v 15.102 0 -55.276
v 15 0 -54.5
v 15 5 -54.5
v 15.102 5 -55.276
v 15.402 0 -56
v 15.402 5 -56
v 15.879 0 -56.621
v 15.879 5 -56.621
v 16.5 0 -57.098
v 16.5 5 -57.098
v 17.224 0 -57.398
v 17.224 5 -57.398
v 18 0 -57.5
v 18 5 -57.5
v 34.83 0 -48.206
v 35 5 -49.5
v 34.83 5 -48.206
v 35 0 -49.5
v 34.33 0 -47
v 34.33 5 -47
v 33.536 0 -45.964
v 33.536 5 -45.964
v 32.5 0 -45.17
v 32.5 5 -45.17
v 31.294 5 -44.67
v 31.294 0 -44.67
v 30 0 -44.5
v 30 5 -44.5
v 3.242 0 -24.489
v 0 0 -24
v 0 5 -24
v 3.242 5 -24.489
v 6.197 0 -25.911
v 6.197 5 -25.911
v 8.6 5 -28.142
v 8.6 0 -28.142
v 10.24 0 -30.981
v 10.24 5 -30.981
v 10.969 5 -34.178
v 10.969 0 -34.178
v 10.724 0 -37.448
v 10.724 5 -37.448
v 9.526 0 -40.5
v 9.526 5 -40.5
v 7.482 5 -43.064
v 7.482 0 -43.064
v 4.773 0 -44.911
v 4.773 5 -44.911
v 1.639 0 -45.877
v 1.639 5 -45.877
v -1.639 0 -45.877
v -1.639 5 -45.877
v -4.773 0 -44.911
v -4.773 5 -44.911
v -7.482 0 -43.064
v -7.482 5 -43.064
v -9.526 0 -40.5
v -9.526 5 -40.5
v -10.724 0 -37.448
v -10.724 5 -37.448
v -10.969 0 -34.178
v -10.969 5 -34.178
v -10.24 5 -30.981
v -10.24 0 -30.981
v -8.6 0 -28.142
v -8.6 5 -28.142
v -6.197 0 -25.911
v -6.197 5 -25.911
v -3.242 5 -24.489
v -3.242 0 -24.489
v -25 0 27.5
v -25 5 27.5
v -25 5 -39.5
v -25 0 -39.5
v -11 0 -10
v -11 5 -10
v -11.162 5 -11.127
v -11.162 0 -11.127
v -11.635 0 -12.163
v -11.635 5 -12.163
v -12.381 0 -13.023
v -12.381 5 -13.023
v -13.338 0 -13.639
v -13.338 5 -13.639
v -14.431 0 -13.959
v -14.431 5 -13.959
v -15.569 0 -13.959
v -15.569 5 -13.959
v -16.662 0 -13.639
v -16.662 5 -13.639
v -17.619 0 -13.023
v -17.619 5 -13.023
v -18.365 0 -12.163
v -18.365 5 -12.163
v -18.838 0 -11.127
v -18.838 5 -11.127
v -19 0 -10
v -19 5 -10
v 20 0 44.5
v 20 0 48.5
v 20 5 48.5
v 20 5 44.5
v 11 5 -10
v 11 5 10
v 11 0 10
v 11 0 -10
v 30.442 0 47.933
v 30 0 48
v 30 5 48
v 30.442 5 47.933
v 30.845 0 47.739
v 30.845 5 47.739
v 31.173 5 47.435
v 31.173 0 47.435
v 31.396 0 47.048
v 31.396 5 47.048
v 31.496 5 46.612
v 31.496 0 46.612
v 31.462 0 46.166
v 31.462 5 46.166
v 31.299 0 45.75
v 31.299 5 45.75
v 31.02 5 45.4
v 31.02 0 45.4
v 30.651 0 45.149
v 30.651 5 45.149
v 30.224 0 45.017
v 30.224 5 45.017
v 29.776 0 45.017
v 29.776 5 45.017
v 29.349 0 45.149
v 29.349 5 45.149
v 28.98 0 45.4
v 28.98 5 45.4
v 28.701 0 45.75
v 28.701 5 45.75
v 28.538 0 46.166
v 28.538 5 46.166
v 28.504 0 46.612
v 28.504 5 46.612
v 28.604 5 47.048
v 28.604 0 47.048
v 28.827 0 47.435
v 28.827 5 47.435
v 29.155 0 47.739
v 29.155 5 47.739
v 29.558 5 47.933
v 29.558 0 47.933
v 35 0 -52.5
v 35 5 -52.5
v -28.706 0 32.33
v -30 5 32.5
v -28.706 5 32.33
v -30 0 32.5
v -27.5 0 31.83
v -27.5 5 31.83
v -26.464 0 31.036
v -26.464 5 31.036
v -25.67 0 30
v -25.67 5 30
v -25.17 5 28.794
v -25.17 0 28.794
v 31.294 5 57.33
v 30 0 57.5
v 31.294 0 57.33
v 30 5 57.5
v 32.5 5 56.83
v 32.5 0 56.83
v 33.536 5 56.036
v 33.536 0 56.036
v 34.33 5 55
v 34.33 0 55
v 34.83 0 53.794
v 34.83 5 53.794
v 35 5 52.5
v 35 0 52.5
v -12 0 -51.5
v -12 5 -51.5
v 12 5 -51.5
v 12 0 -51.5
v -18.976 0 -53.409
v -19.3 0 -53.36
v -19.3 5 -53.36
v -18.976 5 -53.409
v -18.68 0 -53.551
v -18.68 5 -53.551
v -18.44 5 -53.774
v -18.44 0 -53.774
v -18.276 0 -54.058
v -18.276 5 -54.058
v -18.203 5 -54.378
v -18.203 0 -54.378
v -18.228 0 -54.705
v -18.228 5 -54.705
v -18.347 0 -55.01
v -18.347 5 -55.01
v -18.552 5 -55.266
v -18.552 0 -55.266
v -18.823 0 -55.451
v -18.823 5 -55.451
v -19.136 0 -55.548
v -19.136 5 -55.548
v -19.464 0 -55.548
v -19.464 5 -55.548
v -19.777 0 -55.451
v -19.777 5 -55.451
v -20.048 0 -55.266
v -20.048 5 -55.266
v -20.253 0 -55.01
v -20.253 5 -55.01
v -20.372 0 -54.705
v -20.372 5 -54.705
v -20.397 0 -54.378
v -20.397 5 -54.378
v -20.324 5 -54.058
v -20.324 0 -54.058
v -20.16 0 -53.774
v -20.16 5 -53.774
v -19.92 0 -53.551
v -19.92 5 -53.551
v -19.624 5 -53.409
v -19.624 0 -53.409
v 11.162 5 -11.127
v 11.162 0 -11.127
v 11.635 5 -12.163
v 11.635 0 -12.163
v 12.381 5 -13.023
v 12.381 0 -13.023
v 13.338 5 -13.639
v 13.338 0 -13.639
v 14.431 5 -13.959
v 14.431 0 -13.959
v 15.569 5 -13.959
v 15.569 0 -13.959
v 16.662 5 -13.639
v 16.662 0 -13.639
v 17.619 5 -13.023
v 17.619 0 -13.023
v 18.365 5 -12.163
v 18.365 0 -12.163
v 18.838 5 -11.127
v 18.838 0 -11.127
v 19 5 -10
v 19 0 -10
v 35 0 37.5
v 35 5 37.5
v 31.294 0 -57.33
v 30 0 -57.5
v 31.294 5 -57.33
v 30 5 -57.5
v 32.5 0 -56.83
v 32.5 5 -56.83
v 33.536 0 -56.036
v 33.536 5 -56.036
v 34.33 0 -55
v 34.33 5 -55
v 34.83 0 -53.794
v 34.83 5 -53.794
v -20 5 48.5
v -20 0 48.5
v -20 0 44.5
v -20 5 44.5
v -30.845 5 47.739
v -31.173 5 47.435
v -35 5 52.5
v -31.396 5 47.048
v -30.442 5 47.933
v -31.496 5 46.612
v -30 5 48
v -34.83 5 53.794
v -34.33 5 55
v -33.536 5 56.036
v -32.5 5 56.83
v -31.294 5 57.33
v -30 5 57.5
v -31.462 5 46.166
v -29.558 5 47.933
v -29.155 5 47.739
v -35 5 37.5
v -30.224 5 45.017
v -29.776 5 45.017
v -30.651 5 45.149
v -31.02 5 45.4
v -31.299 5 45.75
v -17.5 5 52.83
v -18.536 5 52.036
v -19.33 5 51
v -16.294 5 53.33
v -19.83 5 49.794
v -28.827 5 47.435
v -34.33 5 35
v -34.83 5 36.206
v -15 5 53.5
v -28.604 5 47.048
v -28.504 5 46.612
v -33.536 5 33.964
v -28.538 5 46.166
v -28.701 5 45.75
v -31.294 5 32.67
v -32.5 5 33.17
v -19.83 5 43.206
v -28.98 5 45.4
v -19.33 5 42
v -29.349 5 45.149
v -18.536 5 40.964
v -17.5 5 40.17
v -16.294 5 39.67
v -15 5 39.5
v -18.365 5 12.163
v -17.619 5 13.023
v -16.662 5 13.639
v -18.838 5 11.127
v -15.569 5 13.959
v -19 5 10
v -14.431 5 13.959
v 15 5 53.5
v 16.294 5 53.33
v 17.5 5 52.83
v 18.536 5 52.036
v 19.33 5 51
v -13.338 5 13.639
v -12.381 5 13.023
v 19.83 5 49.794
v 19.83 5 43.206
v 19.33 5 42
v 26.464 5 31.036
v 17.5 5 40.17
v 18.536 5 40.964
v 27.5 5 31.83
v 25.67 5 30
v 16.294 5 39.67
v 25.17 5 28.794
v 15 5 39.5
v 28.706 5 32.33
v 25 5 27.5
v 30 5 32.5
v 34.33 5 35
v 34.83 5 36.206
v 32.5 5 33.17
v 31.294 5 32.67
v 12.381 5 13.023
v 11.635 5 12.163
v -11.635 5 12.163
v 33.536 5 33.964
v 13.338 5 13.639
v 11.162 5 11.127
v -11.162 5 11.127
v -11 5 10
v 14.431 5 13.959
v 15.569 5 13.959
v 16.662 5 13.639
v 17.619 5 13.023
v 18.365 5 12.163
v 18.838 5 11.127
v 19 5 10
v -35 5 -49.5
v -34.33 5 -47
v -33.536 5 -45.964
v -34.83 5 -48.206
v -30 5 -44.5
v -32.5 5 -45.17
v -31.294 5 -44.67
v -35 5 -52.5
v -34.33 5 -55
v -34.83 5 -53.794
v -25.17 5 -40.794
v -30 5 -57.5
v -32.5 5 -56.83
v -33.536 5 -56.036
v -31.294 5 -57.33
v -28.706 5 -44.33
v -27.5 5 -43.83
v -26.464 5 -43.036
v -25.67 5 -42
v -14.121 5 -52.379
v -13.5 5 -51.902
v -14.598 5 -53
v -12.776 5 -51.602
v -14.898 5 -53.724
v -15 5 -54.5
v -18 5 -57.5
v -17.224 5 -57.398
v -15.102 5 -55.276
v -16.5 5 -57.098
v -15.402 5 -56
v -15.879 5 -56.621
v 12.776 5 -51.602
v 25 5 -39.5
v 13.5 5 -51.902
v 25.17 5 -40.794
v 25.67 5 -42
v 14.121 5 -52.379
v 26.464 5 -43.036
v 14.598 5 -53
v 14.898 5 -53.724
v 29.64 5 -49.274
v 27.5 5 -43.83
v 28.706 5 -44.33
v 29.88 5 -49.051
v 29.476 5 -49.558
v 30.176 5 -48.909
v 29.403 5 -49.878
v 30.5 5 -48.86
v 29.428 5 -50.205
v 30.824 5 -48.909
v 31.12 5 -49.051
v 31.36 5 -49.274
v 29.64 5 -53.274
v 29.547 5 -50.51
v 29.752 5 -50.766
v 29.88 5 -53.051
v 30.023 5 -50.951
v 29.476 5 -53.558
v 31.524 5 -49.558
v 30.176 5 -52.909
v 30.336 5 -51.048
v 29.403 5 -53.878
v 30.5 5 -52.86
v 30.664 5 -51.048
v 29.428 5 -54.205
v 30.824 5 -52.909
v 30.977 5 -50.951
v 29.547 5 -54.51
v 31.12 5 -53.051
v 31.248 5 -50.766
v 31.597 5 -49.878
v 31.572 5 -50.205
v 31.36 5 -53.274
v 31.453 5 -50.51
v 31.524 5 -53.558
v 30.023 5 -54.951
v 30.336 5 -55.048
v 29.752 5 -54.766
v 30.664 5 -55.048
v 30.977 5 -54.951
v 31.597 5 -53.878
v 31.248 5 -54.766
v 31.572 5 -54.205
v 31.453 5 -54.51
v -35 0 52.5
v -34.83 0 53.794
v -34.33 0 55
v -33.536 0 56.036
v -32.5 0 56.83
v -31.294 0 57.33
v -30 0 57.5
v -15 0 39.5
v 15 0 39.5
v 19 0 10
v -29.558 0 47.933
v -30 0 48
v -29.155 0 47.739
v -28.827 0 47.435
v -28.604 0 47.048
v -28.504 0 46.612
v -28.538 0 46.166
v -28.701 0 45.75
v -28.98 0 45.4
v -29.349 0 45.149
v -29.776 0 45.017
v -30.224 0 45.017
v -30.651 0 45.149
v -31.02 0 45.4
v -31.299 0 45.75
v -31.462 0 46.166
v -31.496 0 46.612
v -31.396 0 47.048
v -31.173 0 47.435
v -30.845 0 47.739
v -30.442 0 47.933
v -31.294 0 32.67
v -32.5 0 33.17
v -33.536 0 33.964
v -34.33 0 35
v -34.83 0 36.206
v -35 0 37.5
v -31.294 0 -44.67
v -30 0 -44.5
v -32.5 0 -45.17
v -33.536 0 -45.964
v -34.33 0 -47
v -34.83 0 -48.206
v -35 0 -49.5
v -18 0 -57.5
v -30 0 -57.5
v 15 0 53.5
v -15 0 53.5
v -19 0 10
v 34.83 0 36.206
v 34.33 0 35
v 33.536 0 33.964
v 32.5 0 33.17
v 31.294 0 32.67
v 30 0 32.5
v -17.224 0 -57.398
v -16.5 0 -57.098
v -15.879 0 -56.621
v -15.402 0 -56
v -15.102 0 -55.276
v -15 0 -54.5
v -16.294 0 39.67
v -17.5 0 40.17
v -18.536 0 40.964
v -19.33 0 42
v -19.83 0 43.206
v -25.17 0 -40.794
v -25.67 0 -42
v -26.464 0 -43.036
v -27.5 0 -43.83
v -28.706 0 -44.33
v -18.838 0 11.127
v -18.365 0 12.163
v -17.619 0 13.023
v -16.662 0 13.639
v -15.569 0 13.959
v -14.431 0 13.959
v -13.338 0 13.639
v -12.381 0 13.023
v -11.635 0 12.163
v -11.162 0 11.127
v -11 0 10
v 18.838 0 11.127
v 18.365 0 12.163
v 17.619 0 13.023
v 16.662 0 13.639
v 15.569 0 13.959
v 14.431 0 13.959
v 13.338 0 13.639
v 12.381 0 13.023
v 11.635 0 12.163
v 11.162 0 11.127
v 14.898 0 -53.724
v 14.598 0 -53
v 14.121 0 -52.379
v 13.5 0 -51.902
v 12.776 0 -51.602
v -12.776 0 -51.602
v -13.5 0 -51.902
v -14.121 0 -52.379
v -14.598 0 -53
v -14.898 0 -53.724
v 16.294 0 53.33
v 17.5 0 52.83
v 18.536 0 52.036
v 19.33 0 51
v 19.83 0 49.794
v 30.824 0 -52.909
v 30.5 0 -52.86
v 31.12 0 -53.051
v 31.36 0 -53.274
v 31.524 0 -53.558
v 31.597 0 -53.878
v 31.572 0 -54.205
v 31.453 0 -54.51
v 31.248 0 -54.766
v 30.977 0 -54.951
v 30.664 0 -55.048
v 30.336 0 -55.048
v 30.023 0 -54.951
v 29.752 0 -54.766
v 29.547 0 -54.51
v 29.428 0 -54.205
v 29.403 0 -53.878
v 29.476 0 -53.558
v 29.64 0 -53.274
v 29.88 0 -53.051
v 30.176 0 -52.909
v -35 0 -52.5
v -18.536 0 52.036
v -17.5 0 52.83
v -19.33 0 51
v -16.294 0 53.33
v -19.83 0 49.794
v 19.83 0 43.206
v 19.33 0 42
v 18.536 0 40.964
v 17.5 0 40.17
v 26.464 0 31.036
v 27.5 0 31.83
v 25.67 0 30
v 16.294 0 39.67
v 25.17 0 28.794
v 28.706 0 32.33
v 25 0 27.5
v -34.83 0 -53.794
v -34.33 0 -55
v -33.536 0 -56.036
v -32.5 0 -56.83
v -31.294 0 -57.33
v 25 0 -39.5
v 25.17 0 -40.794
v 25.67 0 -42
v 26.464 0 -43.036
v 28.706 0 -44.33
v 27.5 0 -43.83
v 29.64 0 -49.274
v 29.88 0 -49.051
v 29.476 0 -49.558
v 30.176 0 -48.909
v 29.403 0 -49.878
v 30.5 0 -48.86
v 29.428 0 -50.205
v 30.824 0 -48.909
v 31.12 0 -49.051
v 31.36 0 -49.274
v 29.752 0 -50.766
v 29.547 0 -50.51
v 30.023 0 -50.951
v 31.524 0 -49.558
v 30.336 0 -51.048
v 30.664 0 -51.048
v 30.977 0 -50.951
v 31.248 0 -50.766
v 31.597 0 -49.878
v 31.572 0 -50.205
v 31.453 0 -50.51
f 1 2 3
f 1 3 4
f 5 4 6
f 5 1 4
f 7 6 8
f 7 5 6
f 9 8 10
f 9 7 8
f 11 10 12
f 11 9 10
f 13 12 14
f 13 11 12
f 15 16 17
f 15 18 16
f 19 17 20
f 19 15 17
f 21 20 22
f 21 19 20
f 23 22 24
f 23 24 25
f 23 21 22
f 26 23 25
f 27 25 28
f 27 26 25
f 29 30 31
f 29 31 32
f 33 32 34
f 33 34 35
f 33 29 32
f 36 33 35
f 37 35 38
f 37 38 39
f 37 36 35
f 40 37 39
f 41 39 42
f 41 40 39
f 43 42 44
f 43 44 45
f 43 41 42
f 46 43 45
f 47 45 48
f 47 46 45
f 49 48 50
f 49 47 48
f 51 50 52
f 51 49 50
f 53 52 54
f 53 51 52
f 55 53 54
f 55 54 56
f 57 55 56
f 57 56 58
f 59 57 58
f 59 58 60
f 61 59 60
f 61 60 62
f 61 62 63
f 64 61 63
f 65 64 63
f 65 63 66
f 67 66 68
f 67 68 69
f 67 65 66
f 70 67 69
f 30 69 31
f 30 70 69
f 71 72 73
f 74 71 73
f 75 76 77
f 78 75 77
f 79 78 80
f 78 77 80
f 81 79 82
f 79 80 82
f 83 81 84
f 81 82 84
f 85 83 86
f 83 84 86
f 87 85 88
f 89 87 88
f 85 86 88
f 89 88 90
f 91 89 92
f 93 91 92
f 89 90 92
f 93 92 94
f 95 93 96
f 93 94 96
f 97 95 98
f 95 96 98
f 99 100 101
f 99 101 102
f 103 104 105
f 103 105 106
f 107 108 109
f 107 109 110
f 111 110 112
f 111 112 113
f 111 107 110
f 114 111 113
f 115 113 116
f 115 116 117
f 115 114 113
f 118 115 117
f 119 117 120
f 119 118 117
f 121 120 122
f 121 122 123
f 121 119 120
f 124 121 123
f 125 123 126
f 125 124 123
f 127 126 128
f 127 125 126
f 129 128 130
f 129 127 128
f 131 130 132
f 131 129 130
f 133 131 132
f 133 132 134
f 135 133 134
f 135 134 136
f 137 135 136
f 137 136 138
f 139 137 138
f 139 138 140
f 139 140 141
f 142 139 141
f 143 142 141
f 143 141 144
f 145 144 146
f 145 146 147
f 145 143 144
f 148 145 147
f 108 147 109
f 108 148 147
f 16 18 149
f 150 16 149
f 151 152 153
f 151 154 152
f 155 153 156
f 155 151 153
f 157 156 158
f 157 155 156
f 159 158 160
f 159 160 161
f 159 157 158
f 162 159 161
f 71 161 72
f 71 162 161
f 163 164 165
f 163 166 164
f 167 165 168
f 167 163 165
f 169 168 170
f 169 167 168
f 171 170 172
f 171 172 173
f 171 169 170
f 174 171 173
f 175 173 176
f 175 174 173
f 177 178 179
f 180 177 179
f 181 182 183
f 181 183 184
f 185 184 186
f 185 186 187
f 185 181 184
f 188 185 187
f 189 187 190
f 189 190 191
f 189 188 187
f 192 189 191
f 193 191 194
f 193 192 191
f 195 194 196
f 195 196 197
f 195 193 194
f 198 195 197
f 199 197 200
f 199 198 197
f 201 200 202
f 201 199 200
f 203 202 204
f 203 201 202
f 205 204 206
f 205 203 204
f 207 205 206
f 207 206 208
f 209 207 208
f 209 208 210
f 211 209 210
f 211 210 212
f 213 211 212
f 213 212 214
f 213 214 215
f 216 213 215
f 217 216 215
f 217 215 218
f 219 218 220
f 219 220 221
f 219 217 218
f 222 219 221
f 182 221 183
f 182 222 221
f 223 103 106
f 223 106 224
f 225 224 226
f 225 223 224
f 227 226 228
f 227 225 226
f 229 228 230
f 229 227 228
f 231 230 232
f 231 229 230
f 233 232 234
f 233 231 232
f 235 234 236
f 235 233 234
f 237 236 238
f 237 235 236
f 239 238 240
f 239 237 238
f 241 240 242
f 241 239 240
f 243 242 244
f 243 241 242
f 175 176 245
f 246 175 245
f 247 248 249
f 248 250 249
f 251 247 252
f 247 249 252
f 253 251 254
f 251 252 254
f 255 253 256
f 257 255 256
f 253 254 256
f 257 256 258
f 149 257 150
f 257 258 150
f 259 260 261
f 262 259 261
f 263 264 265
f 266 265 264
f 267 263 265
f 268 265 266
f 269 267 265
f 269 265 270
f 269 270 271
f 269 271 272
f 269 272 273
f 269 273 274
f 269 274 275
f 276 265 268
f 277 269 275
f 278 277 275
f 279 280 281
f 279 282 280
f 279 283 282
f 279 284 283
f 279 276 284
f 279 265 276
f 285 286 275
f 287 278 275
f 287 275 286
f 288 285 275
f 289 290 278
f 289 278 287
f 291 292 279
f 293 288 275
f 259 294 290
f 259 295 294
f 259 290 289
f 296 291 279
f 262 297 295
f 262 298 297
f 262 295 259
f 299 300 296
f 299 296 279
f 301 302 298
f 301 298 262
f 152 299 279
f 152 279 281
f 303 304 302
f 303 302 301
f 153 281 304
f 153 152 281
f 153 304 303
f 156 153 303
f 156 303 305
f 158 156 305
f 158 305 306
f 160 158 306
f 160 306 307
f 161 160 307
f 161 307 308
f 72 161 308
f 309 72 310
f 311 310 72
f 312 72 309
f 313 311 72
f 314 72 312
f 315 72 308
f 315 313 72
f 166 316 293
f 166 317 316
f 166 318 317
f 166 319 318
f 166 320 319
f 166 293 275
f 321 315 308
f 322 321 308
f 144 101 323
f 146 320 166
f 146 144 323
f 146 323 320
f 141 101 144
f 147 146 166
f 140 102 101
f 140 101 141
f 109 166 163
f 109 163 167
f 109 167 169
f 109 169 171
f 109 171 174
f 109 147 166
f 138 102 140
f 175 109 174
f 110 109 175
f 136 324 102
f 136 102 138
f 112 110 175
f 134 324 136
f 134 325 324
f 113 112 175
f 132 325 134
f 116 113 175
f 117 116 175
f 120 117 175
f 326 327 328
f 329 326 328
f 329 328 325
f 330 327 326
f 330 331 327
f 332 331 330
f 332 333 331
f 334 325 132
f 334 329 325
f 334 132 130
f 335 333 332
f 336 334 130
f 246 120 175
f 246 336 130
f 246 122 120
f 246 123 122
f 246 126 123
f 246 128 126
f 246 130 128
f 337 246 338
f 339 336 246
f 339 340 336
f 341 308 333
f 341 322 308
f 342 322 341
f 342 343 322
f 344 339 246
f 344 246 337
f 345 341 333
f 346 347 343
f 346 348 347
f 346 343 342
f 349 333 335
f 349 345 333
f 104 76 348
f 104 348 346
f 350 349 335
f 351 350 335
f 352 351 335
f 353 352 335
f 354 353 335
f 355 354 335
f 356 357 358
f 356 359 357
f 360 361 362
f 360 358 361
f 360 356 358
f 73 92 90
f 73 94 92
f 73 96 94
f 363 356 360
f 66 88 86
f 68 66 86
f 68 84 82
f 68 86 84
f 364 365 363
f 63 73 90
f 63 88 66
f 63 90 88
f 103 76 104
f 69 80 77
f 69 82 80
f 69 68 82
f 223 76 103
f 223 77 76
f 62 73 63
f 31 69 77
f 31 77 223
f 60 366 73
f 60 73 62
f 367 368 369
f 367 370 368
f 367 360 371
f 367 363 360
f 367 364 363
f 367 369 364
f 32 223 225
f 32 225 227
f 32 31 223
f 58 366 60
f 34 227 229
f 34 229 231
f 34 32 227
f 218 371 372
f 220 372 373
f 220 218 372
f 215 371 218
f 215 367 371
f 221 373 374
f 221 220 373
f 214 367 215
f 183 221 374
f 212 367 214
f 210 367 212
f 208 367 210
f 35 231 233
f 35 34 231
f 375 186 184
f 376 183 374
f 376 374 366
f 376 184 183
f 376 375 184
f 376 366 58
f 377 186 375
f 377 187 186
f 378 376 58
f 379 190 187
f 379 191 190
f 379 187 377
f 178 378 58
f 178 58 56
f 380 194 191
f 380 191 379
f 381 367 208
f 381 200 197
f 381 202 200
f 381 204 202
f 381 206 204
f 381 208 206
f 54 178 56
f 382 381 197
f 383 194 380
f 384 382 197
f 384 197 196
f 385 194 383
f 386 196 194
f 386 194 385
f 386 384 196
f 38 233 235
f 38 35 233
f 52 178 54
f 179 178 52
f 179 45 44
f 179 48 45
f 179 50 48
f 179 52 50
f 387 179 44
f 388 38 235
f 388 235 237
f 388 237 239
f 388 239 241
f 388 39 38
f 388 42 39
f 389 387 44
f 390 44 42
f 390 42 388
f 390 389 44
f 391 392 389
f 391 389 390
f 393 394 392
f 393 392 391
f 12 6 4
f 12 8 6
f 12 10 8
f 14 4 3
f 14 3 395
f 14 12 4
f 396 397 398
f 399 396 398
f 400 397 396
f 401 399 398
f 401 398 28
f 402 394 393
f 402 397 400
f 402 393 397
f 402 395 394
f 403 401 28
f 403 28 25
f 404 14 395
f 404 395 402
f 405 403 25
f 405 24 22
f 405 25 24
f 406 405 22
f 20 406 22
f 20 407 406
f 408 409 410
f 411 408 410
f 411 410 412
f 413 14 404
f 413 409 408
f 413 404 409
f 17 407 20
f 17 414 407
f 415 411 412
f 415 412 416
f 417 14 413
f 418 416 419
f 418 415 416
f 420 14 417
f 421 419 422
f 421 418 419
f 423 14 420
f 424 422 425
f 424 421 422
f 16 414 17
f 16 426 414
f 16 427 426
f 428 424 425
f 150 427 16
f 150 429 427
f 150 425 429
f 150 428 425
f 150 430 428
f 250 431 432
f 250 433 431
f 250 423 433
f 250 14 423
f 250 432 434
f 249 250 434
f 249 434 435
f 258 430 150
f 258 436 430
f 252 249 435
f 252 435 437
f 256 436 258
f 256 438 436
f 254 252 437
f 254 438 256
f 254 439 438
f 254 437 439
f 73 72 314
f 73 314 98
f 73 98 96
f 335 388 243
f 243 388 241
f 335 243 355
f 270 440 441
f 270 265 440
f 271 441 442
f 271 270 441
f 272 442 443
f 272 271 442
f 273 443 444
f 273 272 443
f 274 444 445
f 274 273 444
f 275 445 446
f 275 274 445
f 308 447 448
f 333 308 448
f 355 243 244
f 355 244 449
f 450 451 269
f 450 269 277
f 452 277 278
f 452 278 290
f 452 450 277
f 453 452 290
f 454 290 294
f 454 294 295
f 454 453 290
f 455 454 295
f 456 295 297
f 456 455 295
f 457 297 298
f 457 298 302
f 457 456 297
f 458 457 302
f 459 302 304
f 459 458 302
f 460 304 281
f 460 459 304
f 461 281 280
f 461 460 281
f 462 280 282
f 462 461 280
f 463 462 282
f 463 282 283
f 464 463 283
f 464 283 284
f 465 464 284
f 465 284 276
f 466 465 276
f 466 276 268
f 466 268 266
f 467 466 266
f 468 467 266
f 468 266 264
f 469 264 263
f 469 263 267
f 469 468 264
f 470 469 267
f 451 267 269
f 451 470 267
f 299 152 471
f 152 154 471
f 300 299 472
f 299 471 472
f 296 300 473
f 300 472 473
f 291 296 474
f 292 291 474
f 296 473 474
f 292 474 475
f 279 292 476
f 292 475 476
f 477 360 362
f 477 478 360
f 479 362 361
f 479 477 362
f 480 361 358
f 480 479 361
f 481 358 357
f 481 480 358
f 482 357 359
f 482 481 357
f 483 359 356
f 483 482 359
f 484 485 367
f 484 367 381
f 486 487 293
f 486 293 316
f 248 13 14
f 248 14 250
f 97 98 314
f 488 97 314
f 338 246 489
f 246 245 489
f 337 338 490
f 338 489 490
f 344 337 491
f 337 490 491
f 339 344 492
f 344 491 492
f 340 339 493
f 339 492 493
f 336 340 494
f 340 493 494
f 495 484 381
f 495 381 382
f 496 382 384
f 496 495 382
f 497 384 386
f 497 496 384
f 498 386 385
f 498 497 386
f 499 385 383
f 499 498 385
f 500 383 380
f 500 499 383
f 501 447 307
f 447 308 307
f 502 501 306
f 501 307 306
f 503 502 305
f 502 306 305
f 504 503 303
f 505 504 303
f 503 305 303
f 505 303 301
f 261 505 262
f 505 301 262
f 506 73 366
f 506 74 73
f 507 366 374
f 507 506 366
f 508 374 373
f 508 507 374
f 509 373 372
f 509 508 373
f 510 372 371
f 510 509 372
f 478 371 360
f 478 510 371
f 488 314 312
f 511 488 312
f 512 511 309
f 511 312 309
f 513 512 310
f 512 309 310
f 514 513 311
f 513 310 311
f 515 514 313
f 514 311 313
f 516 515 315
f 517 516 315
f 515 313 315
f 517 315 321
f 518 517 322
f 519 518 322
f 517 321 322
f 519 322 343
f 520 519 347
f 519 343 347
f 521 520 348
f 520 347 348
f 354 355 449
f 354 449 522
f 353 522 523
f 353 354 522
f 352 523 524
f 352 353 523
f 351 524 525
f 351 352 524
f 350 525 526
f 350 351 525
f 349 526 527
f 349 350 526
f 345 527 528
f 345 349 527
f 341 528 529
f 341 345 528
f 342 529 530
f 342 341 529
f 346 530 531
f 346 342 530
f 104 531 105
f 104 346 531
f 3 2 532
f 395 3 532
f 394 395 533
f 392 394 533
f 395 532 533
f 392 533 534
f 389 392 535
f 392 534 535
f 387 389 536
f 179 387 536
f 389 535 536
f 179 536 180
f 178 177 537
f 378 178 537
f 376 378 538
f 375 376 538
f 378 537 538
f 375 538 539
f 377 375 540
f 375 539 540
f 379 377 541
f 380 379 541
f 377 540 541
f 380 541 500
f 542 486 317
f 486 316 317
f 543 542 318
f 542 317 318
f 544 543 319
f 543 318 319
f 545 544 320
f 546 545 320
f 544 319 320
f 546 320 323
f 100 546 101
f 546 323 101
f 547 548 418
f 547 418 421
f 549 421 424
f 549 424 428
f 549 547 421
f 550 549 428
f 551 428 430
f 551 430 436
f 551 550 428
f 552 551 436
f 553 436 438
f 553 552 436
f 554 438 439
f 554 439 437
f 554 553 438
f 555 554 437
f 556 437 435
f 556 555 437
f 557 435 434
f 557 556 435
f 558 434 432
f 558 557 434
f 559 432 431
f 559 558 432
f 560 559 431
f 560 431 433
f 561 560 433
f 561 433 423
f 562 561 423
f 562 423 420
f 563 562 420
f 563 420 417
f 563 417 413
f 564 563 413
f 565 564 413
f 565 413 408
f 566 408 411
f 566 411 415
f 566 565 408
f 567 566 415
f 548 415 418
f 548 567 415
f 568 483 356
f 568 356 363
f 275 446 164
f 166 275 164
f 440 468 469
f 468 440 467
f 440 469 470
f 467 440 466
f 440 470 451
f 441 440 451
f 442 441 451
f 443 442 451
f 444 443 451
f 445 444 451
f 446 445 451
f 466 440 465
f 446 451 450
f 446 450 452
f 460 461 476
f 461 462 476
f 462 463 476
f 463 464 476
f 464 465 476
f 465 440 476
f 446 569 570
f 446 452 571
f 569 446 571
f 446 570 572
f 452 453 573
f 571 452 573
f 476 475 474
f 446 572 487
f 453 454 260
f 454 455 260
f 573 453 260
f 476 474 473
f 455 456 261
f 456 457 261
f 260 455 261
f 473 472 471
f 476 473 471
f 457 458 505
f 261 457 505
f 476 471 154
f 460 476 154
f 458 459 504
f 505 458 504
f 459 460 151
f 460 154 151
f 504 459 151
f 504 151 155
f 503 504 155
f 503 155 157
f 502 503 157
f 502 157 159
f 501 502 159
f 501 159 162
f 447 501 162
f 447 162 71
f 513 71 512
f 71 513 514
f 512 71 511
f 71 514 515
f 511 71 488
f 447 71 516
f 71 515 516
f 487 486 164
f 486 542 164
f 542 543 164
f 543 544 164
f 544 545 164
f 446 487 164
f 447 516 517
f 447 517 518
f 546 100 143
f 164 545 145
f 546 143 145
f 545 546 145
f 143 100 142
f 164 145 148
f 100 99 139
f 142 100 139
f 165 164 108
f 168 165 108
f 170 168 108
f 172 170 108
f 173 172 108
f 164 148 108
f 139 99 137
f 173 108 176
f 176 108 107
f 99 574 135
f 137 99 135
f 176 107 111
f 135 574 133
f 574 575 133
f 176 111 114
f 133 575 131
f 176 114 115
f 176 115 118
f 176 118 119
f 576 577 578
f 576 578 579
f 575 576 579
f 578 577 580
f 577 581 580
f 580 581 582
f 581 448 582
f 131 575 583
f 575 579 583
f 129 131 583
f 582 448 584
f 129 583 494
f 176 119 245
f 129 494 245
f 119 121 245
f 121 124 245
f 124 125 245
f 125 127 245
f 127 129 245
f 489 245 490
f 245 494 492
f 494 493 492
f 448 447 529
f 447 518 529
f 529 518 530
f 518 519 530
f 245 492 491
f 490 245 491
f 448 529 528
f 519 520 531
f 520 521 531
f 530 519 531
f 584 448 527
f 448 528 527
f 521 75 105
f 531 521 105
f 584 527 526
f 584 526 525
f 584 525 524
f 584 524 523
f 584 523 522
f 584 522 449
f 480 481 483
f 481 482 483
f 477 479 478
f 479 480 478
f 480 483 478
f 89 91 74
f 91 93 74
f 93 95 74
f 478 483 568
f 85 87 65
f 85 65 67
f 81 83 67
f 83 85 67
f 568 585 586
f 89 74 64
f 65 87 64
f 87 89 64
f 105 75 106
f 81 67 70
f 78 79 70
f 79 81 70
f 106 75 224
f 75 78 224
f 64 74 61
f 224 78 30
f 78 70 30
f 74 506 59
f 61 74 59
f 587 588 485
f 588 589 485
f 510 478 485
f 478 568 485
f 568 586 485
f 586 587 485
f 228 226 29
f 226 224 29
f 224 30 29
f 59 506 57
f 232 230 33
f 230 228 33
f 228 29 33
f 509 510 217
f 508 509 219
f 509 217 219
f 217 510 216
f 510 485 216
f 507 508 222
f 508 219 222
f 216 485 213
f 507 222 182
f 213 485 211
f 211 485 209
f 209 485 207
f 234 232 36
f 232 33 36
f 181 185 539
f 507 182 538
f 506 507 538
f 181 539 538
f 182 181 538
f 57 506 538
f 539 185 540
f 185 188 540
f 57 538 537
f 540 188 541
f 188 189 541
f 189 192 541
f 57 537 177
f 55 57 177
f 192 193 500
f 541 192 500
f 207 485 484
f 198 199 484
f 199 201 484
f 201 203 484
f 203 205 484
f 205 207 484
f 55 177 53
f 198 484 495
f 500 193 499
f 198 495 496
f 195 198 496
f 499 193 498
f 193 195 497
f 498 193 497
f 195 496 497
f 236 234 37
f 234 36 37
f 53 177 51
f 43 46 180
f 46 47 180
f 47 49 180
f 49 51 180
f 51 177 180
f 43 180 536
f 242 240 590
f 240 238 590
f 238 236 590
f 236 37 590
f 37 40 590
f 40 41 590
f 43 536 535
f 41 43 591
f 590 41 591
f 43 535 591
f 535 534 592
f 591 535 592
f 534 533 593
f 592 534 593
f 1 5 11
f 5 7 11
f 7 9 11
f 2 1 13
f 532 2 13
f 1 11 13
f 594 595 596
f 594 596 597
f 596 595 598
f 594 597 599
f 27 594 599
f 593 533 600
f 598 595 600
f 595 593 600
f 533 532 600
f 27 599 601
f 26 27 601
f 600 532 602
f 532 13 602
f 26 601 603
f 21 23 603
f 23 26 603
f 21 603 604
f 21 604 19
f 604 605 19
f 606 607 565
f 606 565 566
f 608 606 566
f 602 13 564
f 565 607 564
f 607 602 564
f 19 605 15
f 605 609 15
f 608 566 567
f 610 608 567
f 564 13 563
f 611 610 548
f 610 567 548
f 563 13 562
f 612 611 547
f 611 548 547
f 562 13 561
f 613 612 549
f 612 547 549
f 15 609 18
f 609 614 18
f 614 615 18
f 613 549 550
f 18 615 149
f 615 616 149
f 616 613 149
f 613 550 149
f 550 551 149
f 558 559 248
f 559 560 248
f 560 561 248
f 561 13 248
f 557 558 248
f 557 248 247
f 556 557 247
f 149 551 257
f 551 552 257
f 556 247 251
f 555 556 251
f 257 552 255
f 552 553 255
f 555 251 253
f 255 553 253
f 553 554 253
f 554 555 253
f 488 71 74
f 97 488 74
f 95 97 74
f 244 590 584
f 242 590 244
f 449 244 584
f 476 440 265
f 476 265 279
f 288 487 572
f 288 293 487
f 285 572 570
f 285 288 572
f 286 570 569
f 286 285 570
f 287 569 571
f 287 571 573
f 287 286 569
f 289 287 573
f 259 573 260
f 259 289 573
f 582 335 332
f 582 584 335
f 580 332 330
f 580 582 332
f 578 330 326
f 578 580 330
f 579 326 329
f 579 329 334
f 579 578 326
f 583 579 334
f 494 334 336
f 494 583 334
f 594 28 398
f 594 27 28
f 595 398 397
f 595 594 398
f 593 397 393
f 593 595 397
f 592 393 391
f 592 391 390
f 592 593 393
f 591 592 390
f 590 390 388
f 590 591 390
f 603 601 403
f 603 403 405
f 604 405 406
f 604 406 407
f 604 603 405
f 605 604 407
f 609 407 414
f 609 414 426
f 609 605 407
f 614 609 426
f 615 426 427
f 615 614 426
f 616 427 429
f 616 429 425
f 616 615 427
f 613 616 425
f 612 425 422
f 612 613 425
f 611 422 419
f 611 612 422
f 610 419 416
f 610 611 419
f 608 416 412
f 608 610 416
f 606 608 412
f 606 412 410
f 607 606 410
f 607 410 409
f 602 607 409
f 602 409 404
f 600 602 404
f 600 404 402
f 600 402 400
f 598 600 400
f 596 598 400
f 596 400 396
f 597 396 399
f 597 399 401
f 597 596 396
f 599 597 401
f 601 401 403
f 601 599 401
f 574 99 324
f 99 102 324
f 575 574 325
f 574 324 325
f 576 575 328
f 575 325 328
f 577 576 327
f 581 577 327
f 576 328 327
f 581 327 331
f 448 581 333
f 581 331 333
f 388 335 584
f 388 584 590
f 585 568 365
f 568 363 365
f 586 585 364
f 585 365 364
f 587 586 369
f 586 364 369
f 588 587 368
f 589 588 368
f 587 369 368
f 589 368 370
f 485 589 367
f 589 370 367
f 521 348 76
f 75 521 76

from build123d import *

# Parameters (mm, degrees)
SKETCH_1_W          = 70
SKETCH_1_H          = 115
SKETCH_1_R          = 1.5
SKETCH_1_R_2        = 1.1
SKETCH_1_R_3        = 11
SKETCH_1_W_2        = 40
SKETCH_1_H_2        = 14
EXTRUDE_1_DEPTH     = 5
FILLET_1_R          = 5
FILLET_2_R          = 5
SKETCH_3_W          = 30
SKETCH_3_H          = 6
SKETCH_3_W_2        = 10
SKETCH_3_H_2        = 77
CUT_EXTRUDE_1_DEPTH = 5
FILLET_START        = -1
FILLET_4_DEPTH      = 7
FILLET_4_2_DEPTH    = 5
FILLET_5_R          = 5
CUT_EXTRUDE_2_DEPTH = 10


with BuildPart() as part:
    # 草图1 → 凸台-拉伸1 (new body)
    with BuildSketch(Plane(origin=(0, 0, 0), x_dir=(1, 0, 0), z_dir=(0, 1, 0))):
        Rectangle(SKETCH_1_W, SKETCH_1_H)
        with Locations(Location((30, -46.5, 0), (0, 0, 270))):
            Circle(SKETCH_1_R, mode=Mode.SUBTRACT)
        with Locations(Location((-30, -46.5, 0), (0, 0, 270))):
            Circle(SKETCH_1_R, mode=Mode.SUBTRACT)
        with Locations(Location((30.5, 53.96, 0), (0, 0, 270))):
            Circle(SKETCH_1_R_2, mode=Mode.SUBTRACT)
        with Locations(Location((30.5, 49.96, 0), (0, 0, 270))):
            Circle(SKETCH_1_R_2, mode=Mode.SUBTRACT)
        with Locations(Location((-19.3, 54.46, 0), (0, 0, 270))):
            Circle(SKETCH_1_R_2, mode=Mode.SUBTRACT)
        with Locations(Location((0, 35, 0), (0, 0, 270))):
            Circle(SKETCH_1_R_3, mode=Mode.SUBTRACT)
        with Locations((0, -46.5)):
            Rectangle(SKETCH_1_W_2, SKETCH_1_H_2, mode=Mode.SUBTRACT)
    extrude(amount=EXTRUDE_1_DEPTH)

    # 圆角1
    fillet_1_edges = [part.edges().sort_by_distance(p)[0] for p in [
        (-35, 2.5, 57.5),
        (-35, 2.5, -57.5),
        (35, 2.5, -57.5),
        (35, 2.5, 57.5),
    ]]
    fillet(fillet_1_edges, radius=FILLET_1_R)

    # 圆角2
    fillet_2_edges = [part.edges().sort_by_distance(p)[0] for p in [
        (20, 2.5, 39.5),
        (-20, 2.5, 39.5),
        (-20, 2.5, 53.5),
        (20, 2.5, 53.5),
    ]]
    fillet(fillet_2_edges, radius=FILLET_2_R)

    # 草图3 → 切除-拉伸1 (cut)
    with BuildSketch(Plane(origin=(0, 5, 0), x_dir=(1, 0, 0), z_dir=(0, 1, 0))):
        with Locations((0, 54.5)):
            Rectangle(SKETCH_3_W, SKETCH_3_H)
        with Locations((30, 6)):
            Rectangle(SKETCH_3_W_2, SKETCH_3_H_2)
        with Locations((-30, 6)):
            Rectangle(SKETCH_3_W_2, SKETCH_3_H_2)
    extrude(amount=-CUT_EXTRUDE_1_DEPTH, mode=Mode.SUBTRACT)

    # 圆角4: read off the stored shape, not the designer's step
    # 圆角4 outline → 圆角4 (cut)
    with BuildSketch(Plane(origin=(0, 0, 0), x_dir=(1, 0, 0), z_dir=(0, 1, 0)).offset(FILLET_START)):
        with BuildLine():
            Line((15, 57.5), (15, 54.5))
            ThreePointArc((15, 54.5), (15.878679656, 56.621320344), (18, 57.5))
            Line((18, 57.5), (15, 57.5))
        make_face()
        with BuildLine():
            ThreePointArc((-18, 57.5), (-15.878679656, 56.621320344), (-15, 54.5))
            Line((-15, 54.5), (-15, 57.5))
            Line((-15, 57.5), (-18, 57.5))
        make_face()
    extrude(amount=FILLET_4_DEPTH, mode=Mode.SUBTRACT)

    # Fillet 4 2 outline → Fillet 4 2 (add)
    with BuildSketch(Plane(origin=(0, 0, 0), x_dir=(1, 0, 0), z_dir=(0, 1, 0))):
        with BuildLine():
            Line((15, 51.5), (15, 54.5))
            ThreePointArc((15, 54.5), (14.121320344, 52.378679656), (12, 51.5))
            Line((12, 51.5), (15, 51.5))
        make_face()
        with BuildLine():
            Line((-15, 51.5), (-12, 51.5))
            ThreePointArc((-12, 51.5), (-14.121320344, 52.378679656), (-15, 54.5))
            Line((-15, 54.5), (-15, 51.5))
        make_face()
    extrude(amount=FILLET_4_2_DEPTH)

    # 圆角5
    fillet_5_edges = [part.edges().sort_by_distance(p)[0] for p in [
        (-25, 2.5, 32.5),
        (25, 2.5, 32.5),
        (25, 2.5, -44.5),
        (-25, 2.5, -44.5),
    ]]
    fillet(fillet_5_edges, radius=FILLET_5_R)
    fillet_5_2_edges = [part.edges().sort_by_distance(p)[0] for p in [
        (-35, 2.5, 32.5),
        (35, 2.5, 32.5),
        (35, 2.5, -44.5),
        (-35, 2.5, -44.5),
    ]]
    fillet(fillet_5_2_edges, radius=FILLET_5_R - 0.0001)  # a hair under: the kernel refuses the full size

    # 草图4 → 切除-拉伸2 (cut)
    with BuildSketch(Plane(origin=(0, 5, 0), x_dir=(1, 0, 0), z_dir=(0, 1, 0))):
        with BuildLine():
            Line((11, -10), (11, 10))
            ThreePointArc((11, 10), (15, 14), (19, 10))
            Line((19, 10), (19, -10))
            ThreePointArc((19, -10), (15, -14), (11, -10))
        make_face()
        with BuildLine():
            Line((-11, -10), (-11, 10))
            ThreePointArc((-11, 10), (-15, 14), (-19, 10))
            Line((-19, 10), (-19, -10))
            ThreePointArc((-19, -10), (-15, -14), (-11, -10))
        make_face()
    extrude(amount=-CUT_EXTRUDE_2_DEPTH, mode=Mode.SUBTRACT)


solid = part.part
